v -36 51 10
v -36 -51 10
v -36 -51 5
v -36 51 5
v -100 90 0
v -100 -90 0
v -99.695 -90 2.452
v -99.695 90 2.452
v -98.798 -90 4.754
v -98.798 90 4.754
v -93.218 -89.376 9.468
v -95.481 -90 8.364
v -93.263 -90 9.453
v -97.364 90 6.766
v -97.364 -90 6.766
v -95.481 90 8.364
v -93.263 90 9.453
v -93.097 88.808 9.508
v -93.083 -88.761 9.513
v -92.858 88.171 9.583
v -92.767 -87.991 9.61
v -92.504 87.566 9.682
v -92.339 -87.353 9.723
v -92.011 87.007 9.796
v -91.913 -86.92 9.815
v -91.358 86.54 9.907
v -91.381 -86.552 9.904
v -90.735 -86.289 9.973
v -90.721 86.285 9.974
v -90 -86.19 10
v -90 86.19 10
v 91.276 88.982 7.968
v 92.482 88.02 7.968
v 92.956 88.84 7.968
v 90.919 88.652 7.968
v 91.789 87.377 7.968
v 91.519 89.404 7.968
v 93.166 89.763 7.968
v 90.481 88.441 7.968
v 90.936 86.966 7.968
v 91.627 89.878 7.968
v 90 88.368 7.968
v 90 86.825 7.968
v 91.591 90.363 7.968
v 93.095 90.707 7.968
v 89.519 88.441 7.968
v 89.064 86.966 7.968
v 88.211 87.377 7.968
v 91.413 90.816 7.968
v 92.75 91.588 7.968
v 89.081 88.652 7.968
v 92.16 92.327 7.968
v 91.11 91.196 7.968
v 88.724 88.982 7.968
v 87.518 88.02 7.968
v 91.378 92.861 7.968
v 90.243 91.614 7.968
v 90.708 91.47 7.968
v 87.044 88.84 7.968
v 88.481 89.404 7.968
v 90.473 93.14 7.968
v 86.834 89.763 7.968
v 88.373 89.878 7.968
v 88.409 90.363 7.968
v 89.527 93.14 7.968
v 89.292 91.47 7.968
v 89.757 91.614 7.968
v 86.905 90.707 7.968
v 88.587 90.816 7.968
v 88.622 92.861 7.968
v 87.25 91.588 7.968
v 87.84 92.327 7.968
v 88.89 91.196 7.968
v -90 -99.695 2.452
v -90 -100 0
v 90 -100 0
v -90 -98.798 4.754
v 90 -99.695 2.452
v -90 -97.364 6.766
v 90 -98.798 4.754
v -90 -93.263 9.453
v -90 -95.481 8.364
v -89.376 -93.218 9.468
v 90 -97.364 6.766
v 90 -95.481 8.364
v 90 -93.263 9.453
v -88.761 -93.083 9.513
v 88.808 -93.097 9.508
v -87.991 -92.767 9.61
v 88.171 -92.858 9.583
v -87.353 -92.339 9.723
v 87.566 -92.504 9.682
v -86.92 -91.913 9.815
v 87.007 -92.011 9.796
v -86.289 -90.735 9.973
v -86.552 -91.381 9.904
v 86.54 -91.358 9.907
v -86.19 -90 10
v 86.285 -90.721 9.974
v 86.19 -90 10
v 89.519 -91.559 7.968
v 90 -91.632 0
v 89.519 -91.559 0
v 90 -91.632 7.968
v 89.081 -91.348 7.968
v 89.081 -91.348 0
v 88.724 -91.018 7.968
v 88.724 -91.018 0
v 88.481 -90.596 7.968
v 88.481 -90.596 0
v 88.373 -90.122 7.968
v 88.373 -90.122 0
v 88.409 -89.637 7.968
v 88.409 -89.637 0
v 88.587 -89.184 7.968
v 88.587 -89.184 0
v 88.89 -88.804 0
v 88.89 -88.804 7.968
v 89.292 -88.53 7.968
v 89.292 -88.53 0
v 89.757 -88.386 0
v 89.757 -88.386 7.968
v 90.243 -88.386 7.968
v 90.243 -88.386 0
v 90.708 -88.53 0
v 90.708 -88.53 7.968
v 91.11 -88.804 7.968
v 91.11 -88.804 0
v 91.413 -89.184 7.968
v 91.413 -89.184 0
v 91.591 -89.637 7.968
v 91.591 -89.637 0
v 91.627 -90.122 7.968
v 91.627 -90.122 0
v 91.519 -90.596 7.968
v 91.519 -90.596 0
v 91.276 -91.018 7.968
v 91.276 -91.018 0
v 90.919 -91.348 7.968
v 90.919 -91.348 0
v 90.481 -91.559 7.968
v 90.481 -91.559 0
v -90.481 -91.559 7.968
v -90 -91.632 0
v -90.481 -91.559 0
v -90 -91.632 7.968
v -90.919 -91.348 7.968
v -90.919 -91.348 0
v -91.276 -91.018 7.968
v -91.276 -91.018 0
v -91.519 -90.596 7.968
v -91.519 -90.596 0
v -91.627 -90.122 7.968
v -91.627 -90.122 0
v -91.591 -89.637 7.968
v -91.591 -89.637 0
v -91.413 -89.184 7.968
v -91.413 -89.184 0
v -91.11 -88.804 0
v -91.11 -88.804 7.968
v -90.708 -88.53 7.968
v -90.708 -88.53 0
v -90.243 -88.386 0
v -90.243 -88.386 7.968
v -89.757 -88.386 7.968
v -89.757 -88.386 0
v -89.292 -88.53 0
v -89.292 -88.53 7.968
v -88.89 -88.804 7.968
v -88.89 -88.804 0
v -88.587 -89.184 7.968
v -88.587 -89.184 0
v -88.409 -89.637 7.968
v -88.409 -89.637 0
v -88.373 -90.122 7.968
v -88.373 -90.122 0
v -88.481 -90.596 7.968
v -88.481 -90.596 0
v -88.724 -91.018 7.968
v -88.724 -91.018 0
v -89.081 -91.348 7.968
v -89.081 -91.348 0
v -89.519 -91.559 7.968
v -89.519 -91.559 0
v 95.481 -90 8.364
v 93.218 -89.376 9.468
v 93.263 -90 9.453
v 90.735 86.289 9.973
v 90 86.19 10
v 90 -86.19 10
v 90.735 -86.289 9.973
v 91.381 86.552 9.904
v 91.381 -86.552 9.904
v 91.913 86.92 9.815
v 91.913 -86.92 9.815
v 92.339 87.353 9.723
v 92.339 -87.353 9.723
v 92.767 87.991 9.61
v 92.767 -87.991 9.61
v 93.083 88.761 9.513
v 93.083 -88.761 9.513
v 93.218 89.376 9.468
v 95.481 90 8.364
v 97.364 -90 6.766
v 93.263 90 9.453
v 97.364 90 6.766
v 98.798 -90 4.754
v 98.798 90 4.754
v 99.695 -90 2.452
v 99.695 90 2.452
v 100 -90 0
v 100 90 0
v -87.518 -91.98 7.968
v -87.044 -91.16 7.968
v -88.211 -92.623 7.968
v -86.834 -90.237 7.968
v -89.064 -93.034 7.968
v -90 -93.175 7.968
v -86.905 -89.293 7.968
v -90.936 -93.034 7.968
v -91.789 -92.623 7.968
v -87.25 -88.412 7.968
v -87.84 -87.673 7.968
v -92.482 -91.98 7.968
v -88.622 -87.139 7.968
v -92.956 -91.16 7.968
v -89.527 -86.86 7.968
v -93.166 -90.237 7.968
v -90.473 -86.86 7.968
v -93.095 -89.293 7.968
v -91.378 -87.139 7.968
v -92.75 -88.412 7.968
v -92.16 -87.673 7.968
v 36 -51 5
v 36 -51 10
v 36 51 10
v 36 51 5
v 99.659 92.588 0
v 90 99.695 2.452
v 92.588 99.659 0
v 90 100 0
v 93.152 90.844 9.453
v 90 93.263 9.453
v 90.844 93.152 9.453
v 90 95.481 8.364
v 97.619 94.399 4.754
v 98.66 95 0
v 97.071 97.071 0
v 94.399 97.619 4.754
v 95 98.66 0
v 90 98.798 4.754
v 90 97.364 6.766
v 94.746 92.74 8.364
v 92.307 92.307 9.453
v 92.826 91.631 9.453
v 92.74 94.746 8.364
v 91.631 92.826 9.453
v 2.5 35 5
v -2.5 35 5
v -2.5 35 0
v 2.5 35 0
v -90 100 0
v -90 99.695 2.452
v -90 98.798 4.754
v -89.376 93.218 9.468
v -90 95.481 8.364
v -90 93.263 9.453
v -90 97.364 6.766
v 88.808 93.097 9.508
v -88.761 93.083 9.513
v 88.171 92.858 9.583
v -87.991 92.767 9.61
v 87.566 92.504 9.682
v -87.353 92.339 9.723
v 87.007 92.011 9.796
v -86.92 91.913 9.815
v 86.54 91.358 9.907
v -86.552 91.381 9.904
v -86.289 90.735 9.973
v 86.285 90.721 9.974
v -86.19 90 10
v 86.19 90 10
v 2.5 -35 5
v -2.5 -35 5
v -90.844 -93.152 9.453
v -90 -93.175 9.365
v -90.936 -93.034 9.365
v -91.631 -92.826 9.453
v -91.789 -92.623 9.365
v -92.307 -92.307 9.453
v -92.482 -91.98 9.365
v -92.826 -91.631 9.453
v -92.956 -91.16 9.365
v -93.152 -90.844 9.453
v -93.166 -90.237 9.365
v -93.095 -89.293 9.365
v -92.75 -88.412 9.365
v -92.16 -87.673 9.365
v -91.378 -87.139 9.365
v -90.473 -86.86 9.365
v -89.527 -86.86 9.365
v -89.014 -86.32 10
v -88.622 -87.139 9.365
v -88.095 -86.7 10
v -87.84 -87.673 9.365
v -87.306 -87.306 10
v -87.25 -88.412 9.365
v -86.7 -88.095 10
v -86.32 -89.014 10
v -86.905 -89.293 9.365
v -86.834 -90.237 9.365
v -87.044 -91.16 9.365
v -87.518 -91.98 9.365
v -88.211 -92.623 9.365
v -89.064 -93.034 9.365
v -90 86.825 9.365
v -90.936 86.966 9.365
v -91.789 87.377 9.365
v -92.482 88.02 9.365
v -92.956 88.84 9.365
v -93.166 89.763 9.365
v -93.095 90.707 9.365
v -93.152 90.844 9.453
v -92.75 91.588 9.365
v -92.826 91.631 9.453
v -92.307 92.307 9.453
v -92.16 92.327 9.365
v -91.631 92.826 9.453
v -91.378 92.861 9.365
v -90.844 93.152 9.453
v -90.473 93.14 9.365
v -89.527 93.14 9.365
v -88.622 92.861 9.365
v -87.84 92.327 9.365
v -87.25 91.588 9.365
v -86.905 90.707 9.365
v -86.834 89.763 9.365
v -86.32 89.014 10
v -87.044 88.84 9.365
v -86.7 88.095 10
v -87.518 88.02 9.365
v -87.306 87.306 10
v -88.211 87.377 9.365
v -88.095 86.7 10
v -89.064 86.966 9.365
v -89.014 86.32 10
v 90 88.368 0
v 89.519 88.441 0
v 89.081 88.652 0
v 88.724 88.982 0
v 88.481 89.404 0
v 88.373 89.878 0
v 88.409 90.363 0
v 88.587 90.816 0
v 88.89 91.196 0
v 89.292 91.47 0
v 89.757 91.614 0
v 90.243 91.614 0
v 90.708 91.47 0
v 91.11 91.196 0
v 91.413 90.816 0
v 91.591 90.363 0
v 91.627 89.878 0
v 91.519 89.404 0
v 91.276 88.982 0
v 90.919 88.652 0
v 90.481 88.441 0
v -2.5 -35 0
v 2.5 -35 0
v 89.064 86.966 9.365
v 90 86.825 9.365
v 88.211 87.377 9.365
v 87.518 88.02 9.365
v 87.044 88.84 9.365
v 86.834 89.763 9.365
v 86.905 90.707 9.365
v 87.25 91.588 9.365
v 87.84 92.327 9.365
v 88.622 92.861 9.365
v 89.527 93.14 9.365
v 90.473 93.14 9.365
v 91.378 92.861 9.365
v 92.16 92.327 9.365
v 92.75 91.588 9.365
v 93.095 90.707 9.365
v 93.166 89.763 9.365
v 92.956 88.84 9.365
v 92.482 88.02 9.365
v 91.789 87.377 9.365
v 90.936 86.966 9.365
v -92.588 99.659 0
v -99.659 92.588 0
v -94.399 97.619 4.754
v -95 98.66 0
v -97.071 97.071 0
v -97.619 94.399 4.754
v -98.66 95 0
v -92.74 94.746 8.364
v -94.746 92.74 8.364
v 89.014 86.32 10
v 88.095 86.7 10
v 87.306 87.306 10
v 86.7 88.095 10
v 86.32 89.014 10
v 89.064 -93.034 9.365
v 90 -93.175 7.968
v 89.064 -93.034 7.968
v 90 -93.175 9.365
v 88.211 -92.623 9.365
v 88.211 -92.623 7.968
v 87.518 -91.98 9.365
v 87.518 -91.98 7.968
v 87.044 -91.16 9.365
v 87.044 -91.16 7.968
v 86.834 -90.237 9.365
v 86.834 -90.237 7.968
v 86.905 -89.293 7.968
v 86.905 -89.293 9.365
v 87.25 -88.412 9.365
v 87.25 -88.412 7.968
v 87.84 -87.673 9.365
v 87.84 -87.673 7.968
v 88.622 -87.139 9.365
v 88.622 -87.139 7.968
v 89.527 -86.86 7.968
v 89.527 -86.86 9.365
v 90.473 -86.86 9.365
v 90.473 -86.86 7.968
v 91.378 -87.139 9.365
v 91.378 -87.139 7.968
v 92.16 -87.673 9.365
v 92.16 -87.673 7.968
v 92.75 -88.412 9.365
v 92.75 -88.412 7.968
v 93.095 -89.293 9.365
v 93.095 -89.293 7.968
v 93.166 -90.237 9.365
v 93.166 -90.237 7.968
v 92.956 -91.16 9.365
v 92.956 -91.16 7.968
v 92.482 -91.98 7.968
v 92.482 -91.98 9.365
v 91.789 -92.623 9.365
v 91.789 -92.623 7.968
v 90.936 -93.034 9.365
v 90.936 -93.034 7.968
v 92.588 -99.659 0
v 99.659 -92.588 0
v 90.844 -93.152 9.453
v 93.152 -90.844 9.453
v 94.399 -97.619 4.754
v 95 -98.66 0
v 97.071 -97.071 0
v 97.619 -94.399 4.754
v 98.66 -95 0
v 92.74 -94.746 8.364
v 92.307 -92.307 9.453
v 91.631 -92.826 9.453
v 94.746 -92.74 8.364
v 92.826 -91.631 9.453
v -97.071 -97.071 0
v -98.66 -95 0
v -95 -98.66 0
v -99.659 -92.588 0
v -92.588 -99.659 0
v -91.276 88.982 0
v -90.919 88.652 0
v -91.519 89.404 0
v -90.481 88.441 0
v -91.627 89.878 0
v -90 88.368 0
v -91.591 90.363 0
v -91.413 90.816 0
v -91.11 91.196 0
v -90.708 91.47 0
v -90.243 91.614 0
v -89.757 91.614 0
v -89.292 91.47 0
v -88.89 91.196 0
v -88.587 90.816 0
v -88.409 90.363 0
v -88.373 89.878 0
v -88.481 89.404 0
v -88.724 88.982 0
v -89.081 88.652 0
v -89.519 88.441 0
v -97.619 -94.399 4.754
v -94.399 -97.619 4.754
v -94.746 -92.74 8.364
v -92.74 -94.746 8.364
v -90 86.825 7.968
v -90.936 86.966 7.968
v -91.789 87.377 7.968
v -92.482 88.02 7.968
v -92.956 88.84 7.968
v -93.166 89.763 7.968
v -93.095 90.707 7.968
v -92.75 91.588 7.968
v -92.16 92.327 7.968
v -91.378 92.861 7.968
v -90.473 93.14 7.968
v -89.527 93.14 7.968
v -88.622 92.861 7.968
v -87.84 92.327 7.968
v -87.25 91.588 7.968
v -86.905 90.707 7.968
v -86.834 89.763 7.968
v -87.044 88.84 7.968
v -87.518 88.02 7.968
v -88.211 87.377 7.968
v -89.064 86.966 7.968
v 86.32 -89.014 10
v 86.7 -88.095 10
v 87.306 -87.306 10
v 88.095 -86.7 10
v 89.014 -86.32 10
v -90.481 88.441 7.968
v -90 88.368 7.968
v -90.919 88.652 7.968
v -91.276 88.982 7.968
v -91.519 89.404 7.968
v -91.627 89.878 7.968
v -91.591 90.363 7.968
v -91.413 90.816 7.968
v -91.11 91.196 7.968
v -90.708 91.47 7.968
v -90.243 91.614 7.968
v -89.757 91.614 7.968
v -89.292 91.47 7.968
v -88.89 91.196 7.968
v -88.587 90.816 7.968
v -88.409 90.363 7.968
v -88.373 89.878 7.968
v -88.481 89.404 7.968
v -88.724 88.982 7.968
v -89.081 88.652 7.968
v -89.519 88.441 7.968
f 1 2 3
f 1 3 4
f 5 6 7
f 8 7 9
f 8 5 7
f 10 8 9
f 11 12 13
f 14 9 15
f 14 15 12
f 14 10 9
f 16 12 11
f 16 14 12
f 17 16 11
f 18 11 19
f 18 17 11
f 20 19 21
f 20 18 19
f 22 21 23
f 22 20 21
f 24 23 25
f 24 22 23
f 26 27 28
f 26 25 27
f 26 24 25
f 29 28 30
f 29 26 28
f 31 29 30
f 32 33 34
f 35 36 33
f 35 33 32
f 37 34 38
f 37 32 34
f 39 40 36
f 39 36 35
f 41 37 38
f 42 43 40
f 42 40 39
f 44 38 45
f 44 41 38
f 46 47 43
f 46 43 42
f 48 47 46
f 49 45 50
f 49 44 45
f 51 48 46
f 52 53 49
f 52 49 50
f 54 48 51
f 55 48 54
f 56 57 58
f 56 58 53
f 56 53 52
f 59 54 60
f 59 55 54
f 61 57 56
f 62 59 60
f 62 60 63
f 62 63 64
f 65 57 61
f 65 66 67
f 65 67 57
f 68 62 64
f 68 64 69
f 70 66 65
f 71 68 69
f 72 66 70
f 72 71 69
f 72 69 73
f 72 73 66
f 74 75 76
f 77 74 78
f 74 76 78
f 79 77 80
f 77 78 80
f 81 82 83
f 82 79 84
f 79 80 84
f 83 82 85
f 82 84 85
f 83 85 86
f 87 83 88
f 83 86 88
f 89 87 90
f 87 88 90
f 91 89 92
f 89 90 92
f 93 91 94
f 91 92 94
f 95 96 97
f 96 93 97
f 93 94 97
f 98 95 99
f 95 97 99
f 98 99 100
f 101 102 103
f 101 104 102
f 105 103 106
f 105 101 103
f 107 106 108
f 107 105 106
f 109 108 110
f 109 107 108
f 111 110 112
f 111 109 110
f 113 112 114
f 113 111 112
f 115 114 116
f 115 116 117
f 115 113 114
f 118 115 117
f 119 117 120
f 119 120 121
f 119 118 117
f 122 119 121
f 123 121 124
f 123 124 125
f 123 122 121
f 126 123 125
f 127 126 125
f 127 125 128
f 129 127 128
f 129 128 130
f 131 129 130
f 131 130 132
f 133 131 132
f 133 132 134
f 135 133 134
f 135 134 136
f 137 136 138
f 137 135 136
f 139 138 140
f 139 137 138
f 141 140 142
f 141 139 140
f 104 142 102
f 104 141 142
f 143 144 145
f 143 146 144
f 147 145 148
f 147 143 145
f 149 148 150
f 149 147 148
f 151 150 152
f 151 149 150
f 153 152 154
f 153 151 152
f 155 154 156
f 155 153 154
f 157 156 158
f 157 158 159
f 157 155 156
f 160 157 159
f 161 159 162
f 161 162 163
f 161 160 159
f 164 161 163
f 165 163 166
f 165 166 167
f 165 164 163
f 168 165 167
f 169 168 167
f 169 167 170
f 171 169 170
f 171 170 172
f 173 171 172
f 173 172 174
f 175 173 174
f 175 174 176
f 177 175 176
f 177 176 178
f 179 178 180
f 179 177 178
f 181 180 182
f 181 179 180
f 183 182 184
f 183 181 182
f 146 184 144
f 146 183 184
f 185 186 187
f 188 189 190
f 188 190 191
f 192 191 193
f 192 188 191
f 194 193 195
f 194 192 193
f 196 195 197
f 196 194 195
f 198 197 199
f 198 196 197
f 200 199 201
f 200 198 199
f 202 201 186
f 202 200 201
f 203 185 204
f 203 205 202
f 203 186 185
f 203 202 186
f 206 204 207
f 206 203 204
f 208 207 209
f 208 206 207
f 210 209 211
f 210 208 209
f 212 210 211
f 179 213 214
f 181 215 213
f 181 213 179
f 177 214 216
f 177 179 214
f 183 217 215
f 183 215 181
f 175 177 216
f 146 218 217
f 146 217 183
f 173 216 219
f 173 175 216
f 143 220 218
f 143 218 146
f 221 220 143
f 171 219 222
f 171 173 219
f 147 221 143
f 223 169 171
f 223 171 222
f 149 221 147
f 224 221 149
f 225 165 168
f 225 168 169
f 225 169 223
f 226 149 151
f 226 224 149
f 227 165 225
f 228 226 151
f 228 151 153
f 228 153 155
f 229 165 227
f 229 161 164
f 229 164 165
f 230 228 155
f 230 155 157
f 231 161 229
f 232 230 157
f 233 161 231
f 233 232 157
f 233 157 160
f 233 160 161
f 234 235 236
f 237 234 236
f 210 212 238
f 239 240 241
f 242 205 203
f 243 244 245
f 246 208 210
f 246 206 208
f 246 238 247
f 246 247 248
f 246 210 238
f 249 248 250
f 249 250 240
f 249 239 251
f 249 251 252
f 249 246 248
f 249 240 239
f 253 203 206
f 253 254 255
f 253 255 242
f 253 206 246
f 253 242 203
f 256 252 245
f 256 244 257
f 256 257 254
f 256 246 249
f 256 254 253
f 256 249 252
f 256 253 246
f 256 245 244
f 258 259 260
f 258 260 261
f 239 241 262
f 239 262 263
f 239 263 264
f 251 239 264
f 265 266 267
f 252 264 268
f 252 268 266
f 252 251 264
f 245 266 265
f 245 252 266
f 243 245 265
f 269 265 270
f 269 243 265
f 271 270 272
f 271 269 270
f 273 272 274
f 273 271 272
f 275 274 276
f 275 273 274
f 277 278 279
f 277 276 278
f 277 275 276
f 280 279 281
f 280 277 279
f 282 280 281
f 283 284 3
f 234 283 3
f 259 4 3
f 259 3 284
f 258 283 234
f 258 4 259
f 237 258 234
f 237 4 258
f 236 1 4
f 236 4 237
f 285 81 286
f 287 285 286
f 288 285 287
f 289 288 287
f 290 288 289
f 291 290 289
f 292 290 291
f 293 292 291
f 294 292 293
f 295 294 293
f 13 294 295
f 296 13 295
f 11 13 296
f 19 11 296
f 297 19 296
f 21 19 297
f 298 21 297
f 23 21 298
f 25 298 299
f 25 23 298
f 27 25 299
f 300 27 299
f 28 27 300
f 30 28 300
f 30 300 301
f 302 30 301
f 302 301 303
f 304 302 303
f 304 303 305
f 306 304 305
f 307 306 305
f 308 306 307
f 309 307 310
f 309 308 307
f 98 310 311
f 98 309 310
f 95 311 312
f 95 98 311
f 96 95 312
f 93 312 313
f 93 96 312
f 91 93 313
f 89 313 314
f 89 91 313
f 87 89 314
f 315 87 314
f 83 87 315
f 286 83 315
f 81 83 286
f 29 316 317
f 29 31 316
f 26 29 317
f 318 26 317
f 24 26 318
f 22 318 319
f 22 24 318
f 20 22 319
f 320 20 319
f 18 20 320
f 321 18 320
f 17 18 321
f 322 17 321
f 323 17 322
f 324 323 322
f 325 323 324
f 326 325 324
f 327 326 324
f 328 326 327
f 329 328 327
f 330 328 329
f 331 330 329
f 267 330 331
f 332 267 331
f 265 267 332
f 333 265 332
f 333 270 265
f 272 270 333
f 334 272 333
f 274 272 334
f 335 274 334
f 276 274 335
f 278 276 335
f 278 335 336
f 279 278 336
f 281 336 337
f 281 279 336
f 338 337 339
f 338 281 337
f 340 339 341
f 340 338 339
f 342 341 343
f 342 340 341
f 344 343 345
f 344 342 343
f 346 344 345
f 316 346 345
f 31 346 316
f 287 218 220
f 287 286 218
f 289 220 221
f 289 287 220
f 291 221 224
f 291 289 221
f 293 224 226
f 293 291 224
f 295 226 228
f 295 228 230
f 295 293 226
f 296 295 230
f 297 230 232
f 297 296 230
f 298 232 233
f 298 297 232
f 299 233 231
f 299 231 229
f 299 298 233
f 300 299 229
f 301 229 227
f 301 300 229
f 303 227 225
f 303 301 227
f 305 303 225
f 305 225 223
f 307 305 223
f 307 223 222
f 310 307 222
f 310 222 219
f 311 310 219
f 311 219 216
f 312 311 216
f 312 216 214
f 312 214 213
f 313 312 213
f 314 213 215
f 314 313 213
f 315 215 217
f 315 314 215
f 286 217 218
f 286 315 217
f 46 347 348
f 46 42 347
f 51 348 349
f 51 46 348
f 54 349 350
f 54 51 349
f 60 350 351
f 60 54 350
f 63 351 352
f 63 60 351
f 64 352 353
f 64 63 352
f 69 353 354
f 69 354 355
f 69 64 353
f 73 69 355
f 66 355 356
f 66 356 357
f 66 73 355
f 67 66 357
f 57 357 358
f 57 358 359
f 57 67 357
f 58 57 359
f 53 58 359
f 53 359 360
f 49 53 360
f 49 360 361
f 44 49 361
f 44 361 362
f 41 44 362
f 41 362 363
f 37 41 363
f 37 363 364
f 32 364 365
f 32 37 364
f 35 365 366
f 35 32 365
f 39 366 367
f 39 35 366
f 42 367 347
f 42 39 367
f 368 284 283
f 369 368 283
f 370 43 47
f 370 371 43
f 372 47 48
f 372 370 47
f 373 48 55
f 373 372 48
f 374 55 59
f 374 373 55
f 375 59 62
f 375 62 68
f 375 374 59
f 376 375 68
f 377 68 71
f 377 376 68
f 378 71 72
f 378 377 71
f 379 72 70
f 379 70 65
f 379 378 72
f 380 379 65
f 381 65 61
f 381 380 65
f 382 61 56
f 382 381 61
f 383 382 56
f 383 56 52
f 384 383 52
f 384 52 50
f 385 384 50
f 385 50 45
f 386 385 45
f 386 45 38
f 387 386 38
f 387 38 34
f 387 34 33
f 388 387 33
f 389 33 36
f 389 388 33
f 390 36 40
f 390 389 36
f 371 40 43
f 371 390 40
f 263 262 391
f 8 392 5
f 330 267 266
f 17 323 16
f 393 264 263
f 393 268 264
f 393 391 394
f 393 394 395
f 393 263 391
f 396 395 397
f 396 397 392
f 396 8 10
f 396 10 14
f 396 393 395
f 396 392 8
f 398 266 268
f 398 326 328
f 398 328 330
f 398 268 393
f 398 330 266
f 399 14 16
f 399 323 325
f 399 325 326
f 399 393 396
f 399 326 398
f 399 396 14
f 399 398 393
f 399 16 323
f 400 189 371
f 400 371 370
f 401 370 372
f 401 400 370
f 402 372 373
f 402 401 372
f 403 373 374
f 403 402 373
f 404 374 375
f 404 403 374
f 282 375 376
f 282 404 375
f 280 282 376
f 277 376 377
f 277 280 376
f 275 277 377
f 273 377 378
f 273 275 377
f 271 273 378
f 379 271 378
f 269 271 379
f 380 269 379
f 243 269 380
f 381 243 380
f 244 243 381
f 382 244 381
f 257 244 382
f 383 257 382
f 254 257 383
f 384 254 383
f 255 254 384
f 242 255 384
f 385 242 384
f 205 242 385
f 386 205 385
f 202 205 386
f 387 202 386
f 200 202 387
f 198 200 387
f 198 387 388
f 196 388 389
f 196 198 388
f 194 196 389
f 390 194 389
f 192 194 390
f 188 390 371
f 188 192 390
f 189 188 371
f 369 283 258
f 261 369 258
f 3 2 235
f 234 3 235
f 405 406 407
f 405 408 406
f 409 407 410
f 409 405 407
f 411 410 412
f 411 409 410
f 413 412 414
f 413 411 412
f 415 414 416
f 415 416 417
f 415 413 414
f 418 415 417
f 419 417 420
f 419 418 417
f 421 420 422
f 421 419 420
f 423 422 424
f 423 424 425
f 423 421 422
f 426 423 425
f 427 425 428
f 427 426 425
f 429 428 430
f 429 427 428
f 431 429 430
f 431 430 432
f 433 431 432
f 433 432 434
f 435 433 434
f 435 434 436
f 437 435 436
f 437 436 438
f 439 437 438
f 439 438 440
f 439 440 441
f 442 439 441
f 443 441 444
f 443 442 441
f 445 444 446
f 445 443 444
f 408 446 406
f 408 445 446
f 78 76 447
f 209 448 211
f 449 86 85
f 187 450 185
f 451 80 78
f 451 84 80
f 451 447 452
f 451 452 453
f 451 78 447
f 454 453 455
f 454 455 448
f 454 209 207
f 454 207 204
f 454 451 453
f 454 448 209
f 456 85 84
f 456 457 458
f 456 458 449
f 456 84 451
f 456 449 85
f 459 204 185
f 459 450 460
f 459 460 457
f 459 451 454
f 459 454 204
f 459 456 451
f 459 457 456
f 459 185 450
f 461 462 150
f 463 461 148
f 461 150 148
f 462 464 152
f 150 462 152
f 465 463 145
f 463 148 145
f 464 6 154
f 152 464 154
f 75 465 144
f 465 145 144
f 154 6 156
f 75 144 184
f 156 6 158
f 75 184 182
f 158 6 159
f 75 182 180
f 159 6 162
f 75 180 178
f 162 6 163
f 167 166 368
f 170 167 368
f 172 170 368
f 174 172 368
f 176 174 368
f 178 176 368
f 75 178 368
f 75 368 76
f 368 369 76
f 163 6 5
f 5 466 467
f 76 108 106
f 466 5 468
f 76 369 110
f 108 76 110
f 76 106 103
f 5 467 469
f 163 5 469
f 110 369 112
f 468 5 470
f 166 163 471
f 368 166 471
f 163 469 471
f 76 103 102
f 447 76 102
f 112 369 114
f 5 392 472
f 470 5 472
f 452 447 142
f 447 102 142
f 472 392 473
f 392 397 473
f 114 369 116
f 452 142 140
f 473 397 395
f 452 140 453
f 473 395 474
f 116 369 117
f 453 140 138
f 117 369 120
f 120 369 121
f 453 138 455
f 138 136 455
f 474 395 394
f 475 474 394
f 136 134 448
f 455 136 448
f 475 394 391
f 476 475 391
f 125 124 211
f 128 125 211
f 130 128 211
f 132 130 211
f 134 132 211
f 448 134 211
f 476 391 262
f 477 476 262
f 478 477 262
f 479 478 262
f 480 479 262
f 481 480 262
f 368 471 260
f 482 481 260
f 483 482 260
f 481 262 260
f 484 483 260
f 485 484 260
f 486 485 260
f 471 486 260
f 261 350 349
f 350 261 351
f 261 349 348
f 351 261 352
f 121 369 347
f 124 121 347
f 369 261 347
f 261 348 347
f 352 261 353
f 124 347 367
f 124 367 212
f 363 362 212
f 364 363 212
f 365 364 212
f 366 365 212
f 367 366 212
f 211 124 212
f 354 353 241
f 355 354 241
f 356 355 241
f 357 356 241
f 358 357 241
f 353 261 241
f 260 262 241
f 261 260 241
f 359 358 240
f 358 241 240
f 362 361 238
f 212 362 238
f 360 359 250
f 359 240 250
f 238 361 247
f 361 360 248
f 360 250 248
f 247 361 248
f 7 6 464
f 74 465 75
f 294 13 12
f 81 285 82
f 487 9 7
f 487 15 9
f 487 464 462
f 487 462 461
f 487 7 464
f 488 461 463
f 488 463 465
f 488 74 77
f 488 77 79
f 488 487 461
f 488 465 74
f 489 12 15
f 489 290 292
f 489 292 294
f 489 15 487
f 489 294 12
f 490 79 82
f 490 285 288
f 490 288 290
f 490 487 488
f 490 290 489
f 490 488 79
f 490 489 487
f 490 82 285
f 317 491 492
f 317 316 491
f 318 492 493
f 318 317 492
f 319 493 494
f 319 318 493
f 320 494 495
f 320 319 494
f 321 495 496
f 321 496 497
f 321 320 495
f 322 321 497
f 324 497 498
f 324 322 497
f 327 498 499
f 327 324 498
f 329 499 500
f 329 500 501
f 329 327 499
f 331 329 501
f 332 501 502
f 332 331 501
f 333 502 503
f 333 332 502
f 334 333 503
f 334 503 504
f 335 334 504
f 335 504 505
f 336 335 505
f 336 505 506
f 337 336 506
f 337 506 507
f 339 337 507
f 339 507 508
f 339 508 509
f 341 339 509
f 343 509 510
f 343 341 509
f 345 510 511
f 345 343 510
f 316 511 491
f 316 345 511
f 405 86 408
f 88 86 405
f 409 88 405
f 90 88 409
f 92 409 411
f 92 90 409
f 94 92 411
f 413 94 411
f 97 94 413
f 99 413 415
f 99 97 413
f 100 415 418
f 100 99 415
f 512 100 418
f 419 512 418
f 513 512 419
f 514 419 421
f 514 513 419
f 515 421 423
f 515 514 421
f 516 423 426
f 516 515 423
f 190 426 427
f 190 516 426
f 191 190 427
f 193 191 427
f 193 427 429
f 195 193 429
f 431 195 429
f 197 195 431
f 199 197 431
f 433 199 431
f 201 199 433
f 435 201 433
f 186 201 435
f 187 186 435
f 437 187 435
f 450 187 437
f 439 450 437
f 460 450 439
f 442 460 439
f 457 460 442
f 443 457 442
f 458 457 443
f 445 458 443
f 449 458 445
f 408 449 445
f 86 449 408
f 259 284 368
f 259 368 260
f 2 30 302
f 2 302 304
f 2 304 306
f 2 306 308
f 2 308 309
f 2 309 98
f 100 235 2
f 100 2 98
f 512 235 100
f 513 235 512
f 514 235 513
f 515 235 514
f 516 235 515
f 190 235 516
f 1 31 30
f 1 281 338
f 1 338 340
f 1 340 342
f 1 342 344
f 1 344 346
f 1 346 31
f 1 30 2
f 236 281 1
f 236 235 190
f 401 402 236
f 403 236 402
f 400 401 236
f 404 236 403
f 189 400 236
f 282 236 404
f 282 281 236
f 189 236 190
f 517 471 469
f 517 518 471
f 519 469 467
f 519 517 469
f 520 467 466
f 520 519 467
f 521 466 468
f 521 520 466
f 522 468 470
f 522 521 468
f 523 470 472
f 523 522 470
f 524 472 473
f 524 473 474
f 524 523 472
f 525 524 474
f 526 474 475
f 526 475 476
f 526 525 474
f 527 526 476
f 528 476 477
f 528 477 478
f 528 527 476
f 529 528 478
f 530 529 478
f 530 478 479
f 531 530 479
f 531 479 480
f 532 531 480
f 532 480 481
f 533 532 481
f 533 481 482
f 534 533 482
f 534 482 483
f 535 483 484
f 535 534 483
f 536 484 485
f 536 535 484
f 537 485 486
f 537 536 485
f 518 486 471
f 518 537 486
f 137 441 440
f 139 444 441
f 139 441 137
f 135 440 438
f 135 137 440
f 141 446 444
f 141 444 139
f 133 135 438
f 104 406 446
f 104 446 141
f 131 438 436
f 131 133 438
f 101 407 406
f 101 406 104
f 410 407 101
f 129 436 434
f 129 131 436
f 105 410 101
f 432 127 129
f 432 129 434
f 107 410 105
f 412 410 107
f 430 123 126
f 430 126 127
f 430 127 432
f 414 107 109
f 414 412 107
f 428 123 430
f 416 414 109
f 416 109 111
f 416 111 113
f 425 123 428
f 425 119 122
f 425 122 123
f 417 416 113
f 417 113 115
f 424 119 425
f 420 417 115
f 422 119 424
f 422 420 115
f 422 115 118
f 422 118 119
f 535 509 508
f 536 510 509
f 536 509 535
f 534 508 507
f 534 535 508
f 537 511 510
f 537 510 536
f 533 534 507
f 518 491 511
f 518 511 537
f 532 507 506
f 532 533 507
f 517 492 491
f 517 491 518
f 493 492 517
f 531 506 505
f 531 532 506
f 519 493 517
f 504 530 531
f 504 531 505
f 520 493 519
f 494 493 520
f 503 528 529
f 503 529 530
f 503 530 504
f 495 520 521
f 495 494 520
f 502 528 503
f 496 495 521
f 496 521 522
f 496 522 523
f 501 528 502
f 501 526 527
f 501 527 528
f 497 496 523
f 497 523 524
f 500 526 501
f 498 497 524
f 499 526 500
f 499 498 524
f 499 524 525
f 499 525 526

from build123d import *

# Parameters (mm, degrees)
CROQUIS3_W                                  = 200
CROQUIS3_H                                  = 200
SALIENTE_EXTRUIR1_DEPTH                     = 10
CROQUIS4_W                                  = 72
CROQUIS4_H                                  = 102
CORTAR_EXTRUIR2_DEPTH                       = 5
CROQUIS5_W                                  = 5
CROQUIS5_H                                  = 70
CORTAR_EXTRUIR3_DEPTH                       = 142.774468788
REDONDEO1_R                                 = 10
REDONDEO2_R                                 = 10
REDONDEO3_R                                 = 10
REDONDEO4_R                                 = 10
REDONDEO5_R                                 = 10
REFRENTADO_PARA_TORNILLO_CON_CABEZA_2_COUNT = 2
REFRENTADO_PARA_TORNILLO_CON_CABEZA_2_PITCH = 180
REFRENTADO_PARA_TORNILLO_CON_CABEZA_3_COUNT = 2
REFRENTADO_PARA_TORNILLO_CON_CABEZA_3_PITCH = 254.558441227
REFRENTADO_PARA_TORNILLO_CON_CABEZA_4_COUNT = 2
REFRENTADO_PARA_TORNILLO_CON_CABEZA_4_PITCH = 180


# Some blends are built 0.0001 mm under size
with BuildPart() as part:
    # Croquis3 → Saliente-Extruir1 (new body)
    with BuildSketch(Plane.XY):
        Rectangle(CROQUIS3_W, CROQUIS3_H)
    extrude(amount=SALIENTE_EXTRUIR1_DEPTH)

    # Croquis4 → Cortar-Extruir2 (cut)
    with BuildSketch(Plane.XY.offset(10)):
        Rectangle(CROQUIS4_W, CROQUIS4_H)
    extrude(amount=-CORTAR_EXTRUIR2_DEPTH, mode=Mode.SUBTRACT)

    # Croquis5 → Cortar-Extruir3 (cut, through all)
    with BuildSketch(Plane.XY.offset(10)):
        Rectangle(CROQUIS5_W, CROQUIS5_H)
    extrude(amount=-CORTAR_EXTRUIR3_DEPTH, mode=Mode.SUBTRACT)

    # Redondeo1
    redondeo1_edges = [part.edges().sort_by_distance(p)[0] for p in [
        (-100, 0, 10),
        (0, -100, 10),
        (100, 0, 10),
        (0, 100, 10),
    ]]
    fillet(redondeo1_edges, radius=REDONDEO1_R - 0.0001)  # a hair under: the kernel refuses the full size

    # Redondeo2
    # the kernel refuses this fillet: 10 mm, written as the material it takes off along each edge
    with BuildSketch(Plane(origin=(90, 90, 10), x_dir=(1, 0, 0), z_dir=(0, -1, 0))) as redondeo2_piece_1:
        with BuildLine():
            CenterArc((0.0001, -9.9999), 9.9999, 0, 90)
            Line((10, -9.9999), (10, 0))
            Line((10, 0), (0.0001, 0))
        make_face()
    revolve(axis=Axis((90, 90, 10), (0, 0, 1)), revolution_arc=90, mode=Mode.SUBTRACT)
    with BuildSketch(Plane(origin=(100, 100, -25), x_dir=(0, -1, 0), z_dir=(0, 0, 1))) as redondeo2_piece_2:
        with BuildLine():
            CenterArc((REDONDEO2_R, -REDONDEO2_R), REDONDEO2_R, 90, 90)
            Line((0, -REDONDEO2_R), (0, 0))
            Line((0, 0), (REDONDEO2_R, 0))
        make_face()
    extrude(amount=35, mode=Mode.SUBTRACT)

    # Redondeo3
    # the kernel refuses this fillet: 10 mm, written as the material it takes off along each edge
    with BuildSketch(Plane(origin=(-90, -90, 10), x_dir=(-1, 0, 0), z_dir=(0, 1, 0))) as redondeo3_piece_1:
        with BuildLine():
            CenterArc((0.0001, -9.9999), 9.9999, 0, 90)
            Line((10, -9.9999), (10, 0))
            Line((10, 0), (0.0001, 0))
        make_face()
    revolve(axis=Axis((-90, -90, 10), (0, 0, 1)), revolution_arc=90, mode=Mode.SUBTRACT)
    with BuildSketch(Plane(origin=(-100, -100, -25), x_dir=(1, 0, 0), z_dir=(0, 0, 1))) as redondeo3_piece_2:
        with BuildLine():
            CenterArc((REDONDEO3_R, REDONDEO3_R), REDONDEO3_R, 180, 90)
            Line((0, REDONDEO3_R), (0, 0))
            Line((0, 0), (REDONDEO3_R, 0))
        make_face()
    extrude(amount=35, mode=Mode.SUBTRACT)

    # Redondeo4
    # the kernel refuses this fillet: 10 mm, written as the material it takes off along each edge
    with BuildSketch(Plane(origin=(90, -90, 10), x_dir=(0, -1, 0), z_dir=(-1, 0, 0))) as redondeo4_piece_1:
        with BuildLine():
            CenterArc((0.0001, -9.9999), 9.9999, 0, 90)
            Line((10, -9.9999), (10, 0))
            Line((10, 0), (0.0001, 0))
        make_face()
    revolve(axis=Axis((90, -90, 10), (0, 0, 1)), revolution_arc=90, mode=Mode.SUBTRACT)
    with BuildSketch(Plane(origin=(100, -100, -25), x_dir=(-1, 0, 0), z_dir=(0, 0, 1))) as redondeo4_piece_2:
        with BuildLine():
            CenterArc((REDONDEO4_R, -REDONDEO4_R), REDONDEO4_R, 90, 90)
            Line((0, -REDONDEO4_R), (0, 0))
            Line((0, 0), (REDONDEO4_R, 0))
        make_face()
    extrude(amount=35, mode=Mode.SUBTRACT)

    # Redondeo5
    # the kernel refuses this fillet: 10 mm, written as the material it takes off along each edge
    with BuildSketch(Plane(origin=(-90, 90, 10), x_dir=(0, 1, 0), z_dir=(1, 0, 0))) as redondeo5_piece_1:
        with BuildLine():
            CenterArc((0.0001, -9.9999), 9.9999, 0, 90)
            Line((10, -9.9999), (10, 0))
            Line((10, 0), (0.0001, 0))
        make_face()
    revolve(axis=Axis((-90, 90, 10), (0, 0, 1)), revolution_arc=90, mode=Mode.SUBTRACT)
    with BuildSketch(Plane(origin=(-100, 100, -25), x_dir=(0, -1, 0), z_dir=(0, 0, 1))) as redondeo5_piece_2:
        with BuildLine():
            CenterArc((REDONDEO5_R, REDONDEO5_R), REDONDEO5_R, 180, 90)
            Line((0, REDONDEO5_R), (0, 0))
            Line((0, 0), (REDONDEO5_R, 0))
        make_face()
    extrude(amount=35, mode=Mode.SUBTRACT)

    # Croquis16 → Refrentado para tornillo con cabeza troncocónica de #45 (revolve, cut)
    with BuildSketch(Plane(origin=(-90, 90, 10), x_dir=(0, -1, 0), z_dir=(1, 0, 0))):
        Polygon((0, 0), (0, 10), (1.63195, 10), (1.63195, 2.032), (3.175, 2.032), (3.175, 0.635), (3.81, 0), align=None)
    refrentado_para_tornillo_con_cabeza_tron = revolve(axis=Axis((-90, 90, 16.35), (0, 0, -1)), mode=Mode.SUBTRACT)

    # Refrentado para tornillo con cabeza  2: Refrentado para tornillo con cabeza troncocónica de #45 ×2
    with Locations(*[(i * REFRENTADO_PARA_TORNILLO_CON_CABEZA_2_PITCH, 0, 0) for i in range(1, REFRENTADO_PARA_TORNILLO_CON_CABEZA_2_COUNT)]):
        add(refrentado_para_tornillo_con_cabeza_tron, mode=Mode.SUBTRACT)

    # Refrentado para tornillo con cabeza  3: Refrentado para tornillo con cabeza troncocónica de #45 ×2
    with Locations(*[Vector(0.7071067811865476, -0.7071067811865476, 0) * (i * REFRENTADO_PARA_TORNILLO_CON_CABEZA_3_PITCH) for i in range(1, REFRENTADO_PARA_TORNILLO_CON_CABEZA_3_COUNT)]):
        add(refrentado_para_tornillo_con_cabeza_tron, mode=Mode.SUBTRACT)

    # Refrentado para tornillo con cabeza  4: Refrentado para tornillo con cabeza troncocónica de #45 ×2
    with Locations(*[(0, -i * REFRENTADO_PARA_TORNILLO_CON_CABEZA_4_PITCH, 0) for i in range(1, REFRENTADO_PARA_TORNILLO_CON_CABEZA_4_COUNT)]):
        add(refrentado_para_tornillo_con_cabeza_tron, mode=Mode.SUBTRACT)


solid = part.part
